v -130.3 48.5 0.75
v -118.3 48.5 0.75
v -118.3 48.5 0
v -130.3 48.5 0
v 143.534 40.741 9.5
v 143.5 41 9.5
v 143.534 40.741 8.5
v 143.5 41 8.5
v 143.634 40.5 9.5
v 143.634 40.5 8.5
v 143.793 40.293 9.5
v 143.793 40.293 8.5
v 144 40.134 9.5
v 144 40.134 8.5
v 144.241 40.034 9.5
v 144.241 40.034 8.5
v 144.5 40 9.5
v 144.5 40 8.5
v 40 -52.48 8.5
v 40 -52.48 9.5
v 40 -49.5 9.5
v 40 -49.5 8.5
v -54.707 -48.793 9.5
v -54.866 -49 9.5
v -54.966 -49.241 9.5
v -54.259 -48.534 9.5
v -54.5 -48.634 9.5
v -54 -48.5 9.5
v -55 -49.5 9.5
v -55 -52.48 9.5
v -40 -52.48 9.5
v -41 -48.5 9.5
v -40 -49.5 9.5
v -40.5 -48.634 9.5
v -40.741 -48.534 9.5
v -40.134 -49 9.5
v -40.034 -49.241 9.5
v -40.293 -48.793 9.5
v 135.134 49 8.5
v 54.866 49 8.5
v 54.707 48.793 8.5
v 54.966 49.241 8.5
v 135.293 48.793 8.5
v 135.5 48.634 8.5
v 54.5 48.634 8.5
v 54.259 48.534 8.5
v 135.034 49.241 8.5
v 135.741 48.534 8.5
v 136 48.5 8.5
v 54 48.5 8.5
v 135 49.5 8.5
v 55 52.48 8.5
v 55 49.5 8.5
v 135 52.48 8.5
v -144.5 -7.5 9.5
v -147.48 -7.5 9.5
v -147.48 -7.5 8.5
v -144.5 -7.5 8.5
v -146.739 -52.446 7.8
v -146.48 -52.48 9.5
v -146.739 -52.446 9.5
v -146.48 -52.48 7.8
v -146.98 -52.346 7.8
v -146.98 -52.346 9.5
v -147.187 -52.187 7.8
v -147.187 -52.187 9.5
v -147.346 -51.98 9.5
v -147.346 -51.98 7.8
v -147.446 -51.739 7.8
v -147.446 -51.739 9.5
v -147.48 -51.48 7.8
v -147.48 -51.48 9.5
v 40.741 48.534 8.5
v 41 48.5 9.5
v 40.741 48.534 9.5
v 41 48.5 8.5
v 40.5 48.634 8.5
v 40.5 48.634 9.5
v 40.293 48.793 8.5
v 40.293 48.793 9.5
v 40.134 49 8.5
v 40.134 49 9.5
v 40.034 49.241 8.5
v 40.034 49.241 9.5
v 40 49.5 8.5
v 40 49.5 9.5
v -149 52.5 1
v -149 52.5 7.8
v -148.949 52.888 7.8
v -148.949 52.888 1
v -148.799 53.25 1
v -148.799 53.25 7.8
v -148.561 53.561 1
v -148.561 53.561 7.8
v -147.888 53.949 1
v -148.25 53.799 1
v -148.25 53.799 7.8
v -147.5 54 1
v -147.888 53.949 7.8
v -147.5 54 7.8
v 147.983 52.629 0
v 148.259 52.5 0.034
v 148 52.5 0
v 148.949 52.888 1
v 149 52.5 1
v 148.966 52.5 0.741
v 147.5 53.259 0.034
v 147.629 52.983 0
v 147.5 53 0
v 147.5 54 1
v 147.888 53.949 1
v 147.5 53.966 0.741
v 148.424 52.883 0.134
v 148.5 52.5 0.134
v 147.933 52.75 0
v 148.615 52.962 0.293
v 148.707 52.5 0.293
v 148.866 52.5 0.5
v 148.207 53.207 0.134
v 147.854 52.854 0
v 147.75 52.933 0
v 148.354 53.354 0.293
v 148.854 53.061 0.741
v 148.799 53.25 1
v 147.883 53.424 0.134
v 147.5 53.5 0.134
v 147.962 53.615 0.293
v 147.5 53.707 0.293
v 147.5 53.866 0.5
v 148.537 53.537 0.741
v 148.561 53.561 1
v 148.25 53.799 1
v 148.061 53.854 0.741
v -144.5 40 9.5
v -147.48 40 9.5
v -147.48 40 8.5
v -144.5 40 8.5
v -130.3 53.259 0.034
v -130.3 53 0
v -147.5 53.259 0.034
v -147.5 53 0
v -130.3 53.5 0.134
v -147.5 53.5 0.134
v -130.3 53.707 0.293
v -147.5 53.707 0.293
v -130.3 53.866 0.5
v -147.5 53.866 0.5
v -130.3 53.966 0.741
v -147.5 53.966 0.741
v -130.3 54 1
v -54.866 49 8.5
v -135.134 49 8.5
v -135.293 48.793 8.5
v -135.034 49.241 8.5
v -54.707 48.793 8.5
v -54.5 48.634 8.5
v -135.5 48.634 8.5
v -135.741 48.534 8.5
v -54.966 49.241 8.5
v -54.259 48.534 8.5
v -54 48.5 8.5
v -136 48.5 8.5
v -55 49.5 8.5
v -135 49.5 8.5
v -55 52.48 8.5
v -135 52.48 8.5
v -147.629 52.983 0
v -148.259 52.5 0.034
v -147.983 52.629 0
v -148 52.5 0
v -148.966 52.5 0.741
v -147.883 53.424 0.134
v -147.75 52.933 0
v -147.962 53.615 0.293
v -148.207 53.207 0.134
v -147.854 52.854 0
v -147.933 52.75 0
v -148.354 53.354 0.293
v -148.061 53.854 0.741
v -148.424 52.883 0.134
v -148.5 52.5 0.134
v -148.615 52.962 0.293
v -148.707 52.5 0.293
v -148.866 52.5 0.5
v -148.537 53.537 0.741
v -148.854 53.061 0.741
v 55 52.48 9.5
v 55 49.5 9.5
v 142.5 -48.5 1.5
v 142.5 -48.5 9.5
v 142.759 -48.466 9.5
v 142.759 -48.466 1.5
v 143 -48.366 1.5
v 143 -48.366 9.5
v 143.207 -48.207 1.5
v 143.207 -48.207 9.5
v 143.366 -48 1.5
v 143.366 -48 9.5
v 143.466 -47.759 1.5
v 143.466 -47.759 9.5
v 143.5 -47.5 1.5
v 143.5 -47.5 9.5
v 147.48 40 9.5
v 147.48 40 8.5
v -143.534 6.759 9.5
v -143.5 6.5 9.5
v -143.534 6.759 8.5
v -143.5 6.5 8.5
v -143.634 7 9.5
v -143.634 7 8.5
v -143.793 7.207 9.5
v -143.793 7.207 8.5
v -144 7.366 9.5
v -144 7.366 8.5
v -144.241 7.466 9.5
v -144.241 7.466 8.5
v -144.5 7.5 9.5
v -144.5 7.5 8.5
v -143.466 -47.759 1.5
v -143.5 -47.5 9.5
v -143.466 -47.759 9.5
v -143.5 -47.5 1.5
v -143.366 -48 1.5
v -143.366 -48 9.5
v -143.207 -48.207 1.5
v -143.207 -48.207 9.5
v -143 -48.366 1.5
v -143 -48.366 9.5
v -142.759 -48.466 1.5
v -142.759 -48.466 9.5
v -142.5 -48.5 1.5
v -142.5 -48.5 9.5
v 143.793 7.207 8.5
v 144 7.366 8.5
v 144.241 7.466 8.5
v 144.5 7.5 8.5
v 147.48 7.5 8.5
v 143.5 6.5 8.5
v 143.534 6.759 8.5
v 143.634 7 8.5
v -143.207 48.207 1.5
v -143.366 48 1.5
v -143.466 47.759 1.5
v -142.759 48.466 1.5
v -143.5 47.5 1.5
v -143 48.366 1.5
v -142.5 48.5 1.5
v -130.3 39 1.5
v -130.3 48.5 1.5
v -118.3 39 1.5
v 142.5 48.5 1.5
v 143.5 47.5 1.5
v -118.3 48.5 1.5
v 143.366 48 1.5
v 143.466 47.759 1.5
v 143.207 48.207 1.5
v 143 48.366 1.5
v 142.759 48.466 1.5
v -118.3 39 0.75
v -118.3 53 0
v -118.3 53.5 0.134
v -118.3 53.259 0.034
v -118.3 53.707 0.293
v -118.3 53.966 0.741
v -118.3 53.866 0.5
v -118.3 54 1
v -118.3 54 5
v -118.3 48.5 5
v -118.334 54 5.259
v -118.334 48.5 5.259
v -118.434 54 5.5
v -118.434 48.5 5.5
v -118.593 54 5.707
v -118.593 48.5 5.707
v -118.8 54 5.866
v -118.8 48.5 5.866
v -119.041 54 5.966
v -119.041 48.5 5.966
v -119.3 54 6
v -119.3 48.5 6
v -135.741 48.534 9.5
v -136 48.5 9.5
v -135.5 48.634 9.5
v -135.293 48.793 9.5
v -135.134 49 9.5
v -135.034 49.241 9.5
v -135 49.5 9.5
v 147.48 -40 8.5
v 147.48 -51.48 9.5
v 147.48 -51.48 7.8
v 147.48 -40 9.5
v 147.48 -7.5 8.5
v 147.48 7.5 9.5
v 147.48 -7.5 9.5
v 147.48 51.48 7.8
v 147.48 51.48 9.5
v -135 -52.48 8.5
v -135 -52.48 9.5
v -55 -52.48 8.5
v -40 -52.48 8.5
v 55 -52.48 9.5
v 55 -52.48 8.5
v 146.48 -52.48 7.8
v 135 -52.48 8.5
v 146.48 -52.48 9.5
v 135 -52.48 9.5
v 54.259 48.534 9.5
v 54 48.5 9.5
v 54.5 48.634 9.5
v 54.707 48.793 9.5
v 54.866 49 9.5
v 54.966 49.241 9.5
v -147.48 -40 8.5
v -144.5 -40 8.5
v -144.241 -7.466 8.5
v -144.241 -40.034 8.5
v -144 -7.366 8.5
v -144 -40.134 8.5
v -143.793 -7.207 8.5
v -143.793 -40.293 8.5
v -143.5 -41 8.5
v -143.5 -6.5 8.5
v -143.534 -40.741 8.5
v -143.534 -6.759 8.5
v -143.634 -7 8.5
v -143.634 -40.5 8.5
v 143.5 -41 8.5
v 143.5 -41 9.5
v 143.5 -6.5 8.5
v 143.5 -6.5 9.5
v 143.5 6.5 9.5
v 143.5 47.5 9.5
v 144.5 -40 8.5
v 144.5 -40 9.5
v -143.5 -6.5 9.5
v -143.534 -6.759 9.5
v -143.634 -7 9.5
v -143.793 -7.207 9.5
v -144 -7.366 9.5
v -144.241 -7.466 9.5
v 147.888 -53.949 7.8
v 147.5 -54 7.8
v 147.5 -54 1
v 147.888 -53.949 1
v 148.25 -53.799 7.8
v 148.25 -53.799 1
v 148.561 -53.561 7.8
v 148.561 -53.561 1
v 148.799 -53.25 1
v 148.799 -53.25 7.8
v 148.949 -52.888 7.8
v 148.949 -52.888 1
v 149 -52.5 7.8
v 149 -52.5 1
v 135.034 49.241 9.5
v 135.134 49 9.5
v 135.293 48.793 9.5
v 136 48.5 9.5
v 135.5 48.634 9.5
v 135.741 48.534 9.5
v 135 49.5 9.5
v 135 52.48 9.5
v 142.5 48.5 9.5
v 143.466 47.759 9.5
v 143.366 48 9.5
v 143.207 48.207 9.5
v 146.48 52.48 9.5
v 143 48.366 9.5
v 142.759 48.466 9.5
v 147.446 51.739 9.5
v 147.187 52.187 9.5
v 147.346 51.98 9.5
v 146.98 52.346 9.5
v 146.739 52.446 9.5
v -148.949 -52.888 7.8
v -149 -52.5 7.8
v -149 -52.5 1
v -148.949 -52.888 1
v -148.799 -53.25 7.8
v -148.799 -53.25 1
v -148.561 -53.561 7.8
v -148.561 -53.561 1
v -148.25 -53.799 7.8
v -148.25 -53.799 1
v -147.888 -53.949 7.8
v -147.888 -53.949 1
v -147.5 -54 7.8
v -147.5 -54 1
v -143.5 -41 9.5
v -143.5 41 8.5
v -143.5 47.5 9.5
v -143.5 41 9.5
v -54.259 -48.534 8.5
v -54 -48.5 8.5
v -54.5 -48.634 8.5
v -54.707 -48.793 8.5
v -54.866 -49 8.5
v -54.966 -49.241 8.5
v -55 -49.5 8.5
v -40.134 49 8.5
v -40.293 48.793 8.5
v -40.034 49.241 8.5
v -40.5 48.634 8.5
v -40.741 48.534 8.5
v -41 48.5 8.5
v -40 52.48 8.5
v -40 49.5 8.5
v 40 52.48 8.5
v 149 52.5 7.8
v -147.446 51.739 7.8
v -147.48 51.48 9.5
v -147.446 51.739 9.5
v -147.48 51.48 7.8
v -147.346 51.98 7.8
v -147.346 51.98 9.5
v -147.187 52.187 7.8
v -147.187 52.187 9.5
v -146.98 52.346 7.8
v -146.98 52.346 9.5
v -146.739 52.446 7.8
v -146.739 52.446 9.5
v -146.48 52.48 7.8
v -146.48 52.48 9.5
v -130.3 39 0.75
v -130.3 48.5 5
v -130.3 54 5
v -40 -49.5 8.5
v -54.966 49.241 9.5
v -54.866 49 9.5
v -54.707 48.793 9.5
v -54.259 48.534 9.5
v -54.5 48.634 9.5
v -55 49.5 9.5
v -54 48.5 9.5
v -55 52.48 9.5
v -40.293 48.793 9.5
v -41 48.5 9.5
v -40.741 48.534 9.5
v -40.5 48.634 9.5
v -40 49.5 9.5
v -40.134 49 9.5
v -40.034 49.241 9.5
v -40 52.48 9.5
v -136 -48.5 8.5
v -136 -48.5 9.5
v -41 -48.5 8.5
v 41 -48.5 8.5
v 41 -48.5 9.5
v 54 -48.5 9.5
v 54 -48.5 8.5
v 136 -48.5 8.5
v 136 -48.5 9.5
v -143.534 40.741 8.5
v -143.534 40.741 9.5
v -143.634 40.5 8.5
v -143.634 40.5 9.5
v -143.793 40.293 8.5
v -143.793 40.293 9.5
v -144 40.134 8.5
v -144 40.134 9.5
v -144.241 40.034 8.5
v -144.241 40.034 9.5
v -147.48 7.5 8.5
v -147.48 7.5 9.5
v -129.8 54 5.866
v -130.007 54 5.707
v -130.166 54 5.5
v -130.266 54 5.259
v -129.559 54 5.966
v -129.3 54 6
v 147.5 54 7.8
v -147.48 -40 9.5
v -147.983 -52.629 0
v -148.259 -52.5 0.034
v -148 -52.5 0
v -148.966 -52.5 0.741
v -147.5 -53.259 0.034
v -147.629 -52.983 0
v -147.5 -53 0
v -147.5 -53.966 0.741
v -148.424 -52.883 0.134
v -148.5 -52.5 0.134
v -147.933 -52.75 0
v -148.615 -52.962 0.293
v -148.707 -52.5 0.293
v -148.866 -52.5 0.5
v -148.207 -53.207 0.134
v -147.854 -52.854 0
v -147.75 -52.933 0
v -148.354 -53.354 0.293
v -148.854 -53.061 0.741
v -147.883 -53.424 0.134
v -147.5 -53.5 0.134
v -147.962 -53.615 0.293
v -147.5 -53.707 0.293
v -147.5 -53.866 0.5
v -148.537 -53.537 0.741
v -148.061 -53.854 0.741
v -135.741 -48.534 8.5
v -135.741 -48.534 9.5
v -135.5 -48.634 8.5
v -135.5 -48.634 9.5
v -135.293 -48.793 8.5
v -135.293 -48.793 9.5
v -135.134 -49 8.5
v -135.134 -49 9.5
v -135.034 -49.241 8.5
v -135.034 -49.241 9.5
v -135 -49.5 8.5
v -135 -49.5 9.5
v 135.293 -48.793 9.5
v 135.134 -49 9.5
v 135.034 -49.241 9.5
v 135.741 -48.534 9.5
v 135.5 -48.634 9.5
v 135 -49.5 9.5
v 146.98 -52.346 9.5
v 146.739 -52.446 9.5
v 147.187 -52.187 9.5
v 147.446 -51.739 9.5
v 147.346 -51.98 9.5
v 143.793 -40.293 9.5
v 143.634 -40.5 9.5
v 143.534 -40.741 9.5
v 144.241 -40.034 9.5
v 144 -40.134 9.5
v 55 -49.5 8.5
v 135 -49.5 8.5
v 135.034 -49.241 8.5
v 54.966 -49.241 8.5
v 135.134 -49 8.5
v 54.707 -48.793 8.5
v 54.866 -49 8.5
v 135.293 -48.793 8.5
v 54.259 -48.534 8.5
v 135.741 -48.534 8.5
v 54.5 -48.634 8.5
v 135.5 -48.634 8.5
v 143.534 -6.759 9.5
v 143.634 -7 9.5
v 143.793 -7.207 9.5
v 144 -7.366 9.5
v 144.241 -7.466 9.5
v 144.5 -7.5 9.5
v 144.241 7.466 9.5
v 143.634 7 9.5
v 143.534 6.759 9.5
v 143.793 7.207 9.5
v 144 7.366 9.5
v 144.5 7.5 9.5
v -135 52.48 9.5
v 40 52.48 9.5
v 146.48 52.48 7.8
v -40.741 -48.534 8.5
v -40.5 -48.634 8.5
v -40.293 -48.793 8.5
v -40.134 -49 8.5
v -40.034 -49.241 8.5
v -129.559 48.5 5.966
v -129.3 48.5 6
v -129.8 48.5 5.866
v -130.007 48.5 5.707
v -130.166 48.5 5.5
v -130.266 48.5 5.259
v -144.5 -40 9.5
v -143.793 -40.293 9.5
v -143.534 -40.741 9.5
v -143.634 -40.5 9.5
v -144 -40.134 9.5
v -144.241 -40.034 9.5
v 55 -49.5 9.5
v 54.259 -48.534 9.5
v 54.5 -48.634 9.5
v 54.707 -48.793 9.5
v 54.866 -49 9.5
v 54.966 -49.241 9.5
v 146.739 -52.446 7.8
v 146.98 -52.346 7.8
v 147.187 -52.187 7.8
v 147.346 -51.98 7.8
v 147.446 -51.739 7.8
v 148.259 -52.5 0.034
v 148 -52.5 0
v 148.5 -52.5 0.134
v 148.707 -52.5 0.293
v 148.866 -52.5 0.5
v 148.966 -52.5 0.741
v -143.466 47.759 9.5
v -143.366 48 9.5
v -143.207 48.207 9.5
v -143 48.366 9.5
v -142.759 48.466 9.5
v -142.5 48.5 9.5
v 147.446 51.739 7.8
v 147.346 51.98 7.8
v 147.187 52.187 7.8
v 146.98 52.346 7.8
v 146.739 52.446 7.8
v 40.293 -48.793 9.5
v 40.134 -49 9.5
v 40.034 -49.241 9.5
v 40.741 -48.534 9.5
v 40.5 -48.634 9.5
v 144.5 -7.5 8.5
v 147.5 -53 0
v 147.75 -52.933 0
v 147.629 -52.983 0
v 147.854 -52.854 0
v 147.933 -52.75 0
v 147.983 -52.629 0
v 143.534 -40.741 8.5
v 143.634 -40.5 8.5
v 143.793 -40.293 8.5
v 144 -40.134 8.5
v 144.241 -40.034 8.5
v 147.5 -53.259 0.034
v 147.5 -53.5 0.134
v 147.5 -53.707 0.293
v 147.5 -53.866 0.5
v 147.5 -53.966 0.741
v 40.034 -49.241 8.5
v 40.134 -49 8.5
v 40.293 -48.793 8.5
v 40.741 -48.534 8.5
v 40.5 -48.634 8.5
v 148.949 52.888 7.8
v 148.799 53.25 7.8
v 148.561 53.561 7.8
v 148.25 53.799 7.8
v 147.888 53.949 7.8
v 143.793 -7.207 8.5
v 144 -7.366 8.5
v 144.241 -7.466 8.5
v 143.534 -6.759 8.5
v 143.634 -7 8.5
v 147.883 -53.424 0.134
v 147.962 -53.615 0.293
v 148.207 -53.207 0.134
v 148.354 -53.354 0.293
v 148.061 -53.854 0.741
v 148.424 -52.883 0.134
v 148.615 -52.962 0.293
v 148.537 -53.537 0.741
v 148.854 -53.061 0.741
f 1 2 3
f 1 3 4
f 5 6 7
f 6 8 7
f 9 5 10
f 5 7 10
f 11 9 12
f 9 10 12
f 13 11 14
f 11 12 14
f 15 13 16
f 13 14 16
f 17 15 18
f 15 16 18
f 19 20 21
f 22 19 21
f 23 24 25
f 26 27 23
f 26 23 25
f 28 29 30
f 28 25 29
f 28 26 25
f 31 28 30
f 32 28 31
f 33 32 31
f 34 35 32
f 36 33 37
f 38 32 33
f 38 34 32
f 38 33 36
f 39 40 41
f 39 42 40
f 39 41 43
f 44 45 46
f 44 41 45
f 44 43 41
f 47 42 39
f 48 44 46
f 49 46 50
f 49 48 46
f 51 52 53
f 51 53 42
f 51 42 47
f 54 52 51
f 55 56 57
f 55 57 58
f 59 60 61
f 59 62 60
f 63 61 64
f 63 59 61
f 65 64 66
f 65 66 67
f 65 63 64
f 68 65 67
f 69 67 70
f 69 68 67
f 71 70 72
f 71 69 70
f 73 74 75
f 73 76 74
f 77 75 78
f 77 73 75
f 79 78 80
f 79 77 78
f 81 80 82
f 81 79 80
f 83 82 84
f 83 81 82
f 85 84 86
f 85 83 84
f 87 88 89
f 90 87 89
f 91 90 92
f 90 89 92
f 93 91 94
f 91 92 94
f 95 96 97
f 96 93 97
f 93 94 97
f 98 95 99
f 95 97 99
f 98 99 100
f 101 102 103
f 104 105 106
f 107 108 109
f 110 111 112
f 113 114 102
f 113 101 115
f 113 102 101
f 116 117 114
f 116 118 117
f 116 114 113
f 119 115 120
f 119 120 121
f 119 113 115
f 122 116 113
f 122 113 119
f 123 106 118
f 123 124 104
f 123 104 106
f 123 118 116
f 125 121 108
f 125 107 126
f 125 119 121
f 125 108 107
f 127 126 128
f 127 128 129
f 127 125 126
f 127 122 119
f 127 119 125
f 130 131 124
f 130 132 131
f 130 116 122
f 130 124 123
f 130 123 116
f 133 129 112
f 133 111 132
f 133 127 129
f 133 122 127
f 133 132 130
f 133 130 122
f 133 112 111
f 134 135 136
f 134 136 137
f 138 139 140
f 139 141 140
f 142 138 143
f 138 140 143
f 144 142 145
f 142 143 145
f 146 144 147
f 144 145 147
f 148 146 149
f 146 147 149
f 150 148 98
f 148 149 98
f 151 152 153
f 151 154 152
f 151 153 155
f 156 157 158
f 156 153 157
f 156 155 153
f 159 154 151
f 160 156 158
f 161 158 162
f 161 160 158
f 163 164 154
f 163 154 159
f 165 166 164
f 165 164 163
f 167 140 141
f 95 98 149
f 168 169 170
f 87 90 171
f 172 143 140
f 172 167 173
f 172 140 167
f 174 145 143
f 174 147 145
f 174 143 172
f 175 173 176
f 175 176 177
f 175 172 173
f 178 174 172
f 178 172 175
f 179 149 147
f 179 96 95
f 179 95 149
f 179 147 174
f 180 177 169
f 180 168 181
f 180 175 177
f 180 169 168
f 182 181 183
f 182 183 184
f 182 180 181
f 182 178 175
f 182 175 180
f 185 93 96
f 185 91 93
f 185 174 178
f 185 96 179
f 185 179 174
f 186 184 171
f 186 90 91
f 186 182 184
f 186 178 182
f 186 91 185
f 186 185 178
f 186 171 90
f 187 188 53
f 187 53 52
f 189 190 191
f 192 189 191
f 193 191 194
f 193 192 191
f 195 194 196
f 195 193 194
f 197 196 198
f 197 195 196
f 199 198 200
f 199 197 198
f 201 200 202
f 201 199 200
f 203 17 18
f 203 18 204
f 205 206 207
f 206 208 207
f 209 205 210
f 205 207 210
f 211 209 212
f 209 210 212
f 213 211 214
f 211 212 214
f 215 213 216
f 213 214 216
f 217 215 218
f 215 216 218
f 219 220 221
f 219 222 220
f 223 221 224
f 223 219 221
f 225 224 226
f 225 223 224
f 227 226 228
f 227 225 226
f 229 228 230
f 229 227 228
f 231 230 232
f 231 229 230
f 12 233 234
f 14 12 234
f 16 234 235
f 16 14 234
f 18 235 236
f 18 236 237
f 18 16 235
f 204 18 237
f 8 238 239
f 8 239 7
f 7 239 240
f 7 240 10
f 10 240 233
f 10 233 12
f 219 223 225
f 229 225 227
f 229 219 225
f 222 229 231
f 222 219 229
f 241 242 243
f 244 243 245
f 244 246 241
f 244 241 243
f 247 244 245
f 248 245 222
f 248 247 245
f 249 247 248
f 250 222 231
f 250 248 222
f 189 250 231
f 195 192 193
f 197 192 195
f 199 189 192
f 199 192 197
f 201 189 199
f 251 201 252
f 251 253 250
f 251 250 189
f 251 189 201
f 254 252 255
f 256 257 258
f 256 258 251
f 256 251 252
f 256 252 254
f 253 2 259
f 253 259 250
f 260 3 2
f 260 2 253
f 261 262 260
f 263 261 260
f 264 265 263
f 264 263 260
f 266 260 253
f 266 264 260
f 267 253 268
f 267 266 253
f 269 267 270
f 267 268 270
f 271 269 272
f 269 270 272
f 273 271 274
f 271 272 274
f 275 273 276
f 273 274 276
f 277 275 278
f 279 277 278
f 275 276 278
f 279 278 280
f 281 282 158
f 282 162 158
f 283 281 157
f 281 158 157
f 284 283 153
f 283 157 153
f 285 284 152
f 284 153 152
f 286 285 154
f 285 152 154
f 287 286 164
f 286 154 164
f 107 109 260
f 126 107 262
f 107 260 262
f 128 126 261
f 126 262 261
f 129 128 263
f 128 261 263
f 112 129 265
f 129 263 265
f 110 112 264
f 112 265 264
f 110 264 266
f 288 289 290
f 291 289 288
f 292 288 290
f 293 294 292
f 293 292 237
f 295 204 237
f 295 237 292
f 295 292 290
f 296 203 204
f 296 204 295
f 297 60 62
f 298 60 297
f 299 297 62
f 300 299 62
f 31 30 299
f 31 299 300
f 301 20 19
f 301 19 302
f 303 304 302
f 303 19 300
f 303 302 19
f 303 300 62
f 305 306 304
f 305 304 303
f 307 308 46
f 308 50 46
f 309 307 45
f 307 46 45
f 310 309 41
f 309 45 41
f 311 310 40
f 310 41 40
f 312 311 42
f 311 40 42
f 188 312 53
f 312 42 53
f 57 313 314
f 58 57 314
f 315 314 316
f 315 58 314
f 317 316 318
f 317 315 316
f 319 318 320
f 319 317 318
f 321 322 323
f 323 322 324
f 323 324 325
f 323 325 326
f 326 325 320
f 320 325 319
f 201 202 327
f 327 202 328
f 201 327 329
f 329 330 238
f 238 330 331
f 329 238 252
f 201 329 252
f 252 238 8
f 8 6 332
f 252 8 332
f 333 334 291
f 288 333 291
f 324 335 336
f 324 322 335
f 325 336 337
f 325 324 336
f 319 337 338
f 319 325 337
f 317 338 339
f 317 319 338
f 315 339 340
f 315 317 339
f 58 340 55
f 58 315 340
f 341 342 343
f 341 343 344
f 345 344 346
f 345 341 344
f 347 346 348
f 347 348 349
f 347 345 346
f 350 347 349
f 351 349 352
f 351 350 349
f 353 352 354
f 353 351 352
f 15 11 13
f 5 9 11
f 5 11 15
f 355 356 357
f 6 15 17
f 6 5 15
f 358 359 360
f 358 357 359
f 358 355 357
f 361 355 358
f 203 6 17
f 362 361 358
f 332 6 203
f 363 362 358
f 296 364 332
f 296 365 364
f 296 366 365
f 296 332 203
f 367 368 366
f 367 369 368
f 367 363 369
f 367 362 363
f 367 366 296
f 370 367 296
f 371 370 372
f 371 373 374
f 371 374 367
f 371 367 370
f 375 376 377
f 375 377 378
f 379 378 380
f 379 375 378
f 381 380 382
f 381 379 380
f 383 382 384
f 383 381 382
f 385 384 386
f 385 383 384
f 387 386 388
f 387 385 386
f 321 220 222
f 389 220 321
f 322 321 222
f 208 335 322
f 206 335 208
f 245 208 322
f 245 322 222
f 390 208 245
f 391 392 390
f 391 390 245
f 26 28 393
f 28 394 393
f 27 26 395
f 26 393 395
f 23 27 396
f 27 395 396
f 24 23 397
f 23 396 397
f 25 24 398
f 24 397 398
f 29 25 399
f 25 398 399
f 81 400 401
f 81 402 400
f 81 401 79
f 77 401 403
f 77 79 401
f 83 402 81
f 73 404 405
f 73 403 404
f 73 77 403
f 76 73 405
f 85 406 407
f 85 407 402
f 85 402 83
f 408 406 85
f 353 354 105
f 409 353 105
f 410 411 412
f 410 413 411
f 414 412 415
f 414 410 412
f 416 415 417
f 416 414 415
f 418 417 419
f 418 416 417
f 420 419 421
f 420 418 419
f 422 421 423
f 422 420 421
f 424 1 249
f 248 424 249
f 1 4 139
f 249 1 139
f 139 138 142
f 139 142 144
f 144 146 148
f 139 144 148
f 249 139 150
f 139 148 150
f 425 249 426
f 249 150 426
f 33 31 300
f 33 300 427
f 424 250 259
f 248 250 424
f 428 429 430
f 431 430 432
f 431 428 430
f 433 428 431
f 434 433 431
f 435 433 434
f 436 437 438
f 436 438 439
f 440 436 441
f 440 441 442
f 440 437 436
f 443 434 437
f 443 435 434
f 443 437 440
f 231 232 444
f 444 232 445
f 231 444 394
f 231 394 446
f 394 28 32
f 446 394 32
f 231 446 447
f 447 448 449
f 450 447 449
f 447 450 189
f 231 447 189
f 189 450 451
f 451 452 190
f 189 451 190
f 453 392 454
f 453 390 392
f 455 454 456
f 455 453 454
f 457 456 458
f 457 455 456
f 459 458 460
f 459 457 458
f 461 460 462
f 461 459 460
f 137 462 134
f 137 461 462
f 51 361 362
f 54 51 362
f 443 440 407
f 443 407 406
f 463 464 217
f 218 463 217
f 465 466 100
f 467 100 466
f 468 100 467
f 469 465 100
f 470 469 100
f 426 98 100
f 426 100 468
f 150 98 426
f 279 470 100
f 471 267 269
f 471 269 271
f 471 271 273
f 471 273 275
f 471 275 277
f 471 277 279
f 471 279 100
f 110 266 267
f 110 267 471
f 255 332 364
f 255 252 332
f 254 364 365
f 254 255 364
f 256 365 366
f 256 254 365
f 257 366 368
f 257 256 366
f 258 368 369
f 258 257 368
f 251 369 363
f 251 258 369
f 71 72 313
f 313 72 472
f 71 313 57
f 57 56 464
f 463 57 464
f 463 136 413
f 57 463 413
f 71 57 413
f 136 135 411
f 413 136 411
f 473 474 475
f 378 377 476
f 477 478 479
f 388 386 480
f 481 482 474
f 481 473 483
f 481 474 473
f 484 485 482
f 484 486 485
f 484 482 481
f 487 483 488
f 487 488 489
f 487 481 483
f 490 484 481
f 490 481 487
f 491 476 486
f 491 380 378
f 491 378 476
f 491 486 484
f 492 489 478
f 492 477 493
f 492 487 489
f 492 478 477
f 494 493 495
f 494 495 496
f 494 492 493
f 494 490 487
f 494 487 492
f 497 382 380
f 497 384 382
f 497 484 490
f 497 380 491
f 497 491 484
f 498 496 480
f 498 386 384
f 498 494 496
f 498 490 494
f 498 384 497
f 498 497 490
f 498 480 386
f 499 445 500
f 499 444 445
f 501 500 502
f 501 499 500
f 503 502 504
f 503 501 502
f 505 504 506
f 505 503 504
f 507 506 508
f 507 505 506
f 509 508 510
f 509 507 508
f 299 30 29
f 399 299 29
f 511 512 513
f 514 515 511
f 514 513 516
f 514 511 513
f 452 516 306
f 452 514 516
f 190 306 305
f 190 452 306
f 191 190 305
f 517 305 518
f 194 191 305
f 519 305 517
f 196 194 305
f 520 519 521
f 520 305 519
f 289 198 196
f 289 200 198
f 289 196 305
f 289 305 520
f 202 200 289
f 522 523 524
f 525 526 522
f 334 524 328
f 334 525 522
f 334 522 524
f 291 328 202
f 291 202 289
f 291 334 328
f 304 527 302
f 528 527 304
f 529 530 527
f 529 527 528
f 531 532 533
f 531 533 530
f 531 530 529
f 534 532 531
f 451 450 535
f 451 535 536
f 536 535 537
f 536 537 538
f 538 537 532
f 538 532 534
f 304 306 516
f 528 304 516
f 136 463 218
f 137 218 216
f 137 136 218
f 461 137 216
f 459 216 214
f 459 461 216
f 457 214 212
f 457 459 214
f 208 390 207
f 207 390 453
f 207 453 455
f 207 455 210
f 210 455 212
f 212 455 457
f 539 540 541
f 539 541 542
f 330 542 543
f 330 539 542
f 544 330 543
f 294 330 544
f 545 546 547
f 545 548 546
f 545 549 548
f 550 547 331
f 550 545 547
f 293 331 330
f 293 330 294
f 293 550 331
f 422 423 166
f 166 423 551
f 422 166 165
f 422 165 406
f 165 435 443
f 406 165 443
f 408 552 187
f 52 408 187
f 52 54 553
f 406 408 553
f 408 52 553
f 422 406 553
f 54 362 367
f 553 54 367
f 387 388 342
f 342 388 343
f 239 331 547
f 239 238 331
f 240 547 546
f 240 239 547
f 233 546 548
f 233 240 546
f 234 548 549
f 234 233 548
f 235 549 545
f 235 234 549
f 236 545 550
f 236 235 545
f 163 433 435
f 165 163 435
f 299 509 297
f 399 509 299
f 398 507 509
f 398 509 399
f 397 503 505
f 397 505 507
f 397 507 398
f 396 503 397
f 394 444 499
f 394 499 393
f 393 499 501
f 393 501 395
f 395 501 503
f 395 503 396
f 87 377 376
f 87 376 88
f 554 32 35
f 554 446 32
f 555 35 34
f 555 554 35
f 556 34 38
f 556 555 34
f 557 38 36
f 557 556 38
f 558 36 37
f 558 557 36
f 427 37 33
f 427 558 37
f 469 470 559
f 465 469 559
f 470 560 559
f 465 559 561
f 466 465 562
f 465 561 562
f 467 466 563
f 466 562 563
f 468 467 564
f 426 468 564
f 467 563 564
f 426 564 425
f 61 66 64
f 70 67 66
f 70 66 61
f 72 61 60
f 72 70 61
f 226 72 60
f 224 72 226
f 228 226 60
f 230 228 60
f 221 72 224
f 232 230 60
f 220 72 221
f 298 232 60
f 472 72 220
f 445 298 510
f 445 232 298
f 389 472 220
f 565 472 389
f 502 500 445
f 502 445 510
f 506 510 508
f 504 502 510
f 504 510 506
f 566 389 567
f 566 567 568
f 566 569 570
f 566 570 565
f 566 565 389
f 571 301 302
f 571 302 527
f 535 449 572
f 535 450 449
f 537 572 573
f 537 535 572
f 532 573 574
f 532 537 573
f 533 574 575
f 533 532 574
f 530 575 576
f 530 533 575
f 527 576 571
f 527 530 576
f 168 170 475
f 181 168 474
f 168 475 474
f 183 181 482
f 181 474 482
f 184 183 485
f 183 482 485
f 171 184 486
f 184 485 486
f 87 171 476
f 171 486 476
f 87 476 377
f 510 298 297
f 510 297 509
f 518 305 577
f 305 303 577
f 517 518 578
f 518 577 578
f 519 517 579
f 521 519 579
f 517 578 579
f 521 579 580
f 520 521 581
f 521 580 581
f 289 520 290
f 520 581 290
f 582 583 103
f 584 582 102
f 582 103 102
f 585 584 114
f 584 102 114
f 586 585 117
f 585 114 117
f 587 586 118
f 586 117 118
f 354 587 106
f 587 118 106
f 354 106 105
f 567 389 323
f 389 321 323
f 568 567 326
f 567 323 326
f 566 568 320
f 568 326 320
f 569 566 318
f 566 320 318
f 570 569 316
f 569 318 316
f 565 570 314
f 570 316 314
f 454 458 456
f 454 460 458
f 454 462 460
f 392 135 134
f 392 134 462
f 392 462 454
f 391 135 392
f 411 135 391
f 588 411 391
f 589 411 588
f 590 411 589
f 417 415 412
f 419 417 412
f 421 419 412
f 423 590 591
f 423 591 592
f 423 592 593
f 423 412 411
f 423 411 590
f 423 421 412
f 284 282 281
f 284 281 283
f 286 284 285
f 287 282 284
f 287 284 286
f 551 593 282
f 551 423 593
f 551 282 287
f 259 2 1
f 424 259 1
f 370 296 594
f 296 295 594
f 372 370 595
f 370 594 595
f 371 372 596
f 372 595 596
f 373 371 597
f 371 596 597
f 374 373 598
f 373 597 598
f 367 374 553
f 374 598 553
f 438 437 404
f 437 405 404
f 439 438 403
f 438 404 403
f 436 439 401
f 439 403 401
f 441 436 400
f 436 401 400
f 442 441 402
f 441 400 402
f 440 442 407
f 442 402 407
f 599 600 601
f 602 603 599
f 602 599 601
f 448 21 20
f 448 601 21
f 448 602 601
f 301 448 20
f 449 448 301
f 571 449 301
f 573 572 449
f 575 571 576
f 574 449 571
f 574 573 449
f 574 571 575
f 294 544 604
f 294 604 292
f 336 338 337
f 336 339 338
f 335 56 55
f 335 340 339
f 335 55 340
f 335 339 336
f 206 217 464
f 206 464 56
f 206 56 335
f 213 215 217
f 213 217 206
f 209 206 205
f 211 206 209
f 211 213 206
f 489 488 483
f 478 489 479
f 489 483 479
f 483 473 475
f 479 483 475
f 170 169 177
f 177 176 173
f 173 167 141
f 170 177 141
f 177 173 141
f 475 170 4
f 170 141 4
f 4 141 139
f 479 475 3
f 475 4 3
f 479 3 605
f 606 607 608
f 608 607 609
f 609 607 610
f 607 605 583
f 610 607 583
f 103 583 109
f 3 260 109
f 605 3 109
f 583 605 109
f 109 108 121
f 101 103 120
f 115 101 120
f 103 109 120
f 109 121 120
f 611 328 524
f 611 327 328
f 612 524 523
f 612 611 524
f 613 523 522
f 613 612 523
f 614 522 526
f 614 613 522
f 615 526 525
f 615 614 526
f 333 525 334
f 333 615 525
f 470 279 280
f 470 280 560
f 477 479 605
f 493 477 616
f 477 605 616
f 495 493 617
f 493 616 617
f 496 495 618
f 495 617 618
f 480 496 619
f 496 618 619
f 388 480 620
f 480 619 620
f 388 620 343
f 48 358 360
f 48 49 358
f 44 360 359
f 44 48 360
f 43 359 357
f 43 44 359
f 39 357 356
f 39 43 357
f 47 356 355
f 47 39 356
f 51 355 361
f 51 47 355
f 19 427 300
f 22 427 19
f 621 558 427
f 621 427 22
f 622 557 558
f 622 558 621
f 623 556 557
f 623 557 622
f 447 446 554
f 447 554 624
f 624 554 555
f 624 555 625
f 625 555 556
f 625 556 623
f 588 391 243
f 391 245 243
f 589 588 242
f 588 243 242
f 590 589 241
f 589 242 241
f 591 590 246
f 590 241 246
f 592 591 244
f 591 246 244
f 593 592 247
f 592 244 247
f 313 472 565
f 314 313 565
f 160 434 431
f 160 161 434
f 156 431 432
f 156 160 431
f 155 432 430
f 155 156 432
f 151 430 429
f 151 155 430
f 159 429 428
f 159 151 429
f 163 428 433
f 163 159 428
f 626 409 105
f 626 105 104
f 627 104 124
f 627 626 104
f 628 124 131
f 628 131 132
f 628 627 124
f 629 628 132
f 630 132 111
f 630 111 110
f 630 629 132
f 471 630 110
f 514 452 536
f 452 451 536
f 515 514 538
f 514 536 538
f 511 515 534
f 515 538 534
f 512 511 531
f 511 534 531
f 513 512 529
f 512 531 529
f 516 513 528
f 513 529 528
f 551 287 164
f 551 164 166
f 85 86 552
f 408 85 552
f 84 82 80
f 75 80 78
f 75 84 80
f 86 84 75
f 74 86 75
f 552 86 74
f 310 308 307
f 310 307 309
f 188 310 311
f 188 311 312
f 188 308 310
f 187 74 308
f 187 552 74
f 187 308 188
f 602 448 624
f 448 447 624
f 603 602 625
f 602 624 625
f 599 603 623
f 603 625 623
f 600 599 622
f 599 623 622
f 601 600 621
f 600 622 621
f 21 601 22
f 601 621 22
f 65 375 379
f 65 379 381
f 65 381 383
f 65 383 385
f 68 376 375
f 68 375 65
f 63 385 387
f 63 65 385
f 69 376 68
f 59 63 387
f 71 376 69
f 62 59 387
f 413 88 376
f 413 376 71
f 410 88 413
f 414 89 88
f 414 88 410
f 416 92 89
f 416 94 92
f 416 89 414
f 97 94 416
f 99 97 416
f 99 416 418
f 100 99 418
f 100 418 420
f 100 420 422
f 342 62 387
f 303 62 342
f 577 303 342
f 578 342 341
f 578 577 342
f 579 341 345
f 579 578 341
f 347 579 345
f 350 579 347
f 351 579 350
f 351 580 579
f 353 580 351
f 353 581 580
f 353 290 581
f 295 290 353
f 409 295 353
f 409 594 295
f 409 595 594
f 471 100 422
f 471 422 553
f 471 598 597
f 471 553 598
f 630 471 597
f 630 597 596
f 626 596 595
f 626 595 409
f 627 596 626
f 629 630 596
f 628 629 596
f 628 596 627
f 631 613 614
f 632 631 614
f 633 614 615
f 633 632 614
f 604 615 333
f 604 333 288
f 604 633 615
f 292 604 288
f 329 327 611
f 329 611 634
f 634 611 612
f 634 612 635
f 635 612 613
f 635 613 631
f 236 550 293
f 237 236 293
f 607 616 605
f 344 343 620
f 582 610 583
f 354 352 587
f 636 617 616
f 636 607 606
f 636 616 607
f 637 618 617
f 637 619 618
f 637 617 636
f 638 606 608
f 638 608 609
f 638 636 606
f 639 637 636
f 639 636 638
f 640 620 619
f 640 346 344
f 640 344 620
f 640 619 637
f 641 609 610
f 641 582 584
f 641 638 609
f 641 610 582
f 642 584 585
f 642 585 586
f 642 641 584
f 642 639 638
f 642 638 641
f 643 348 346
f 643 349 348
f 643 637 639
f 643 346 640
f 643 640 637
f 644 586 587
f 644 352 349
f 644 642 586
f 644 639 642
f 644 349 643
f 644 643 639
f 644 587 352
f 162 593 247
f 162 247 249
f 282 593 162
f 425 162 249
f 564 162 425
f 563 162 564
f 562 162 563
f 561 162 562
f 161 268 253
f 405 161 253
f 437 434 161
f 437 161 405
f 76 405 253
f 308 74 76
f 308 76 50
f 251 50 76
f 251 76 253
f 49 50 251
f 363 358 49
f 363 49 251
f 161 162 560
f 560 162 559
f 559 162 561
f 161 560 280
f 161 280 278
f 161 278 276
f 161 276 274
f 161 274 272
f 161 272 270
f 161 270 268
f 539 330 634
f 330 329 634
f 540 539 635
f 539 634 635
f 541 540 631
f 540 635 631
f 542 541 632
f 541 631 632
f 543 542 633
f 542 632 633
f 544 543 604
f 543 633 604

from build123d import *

# Parameters (mm, degrees)
SKETCH001_W     = 298
SKETCH001_H     = 108
PAD_DEPTH       = 9.5
SKETCH002_W     = 287
SKETCH002_H     = 97
POCKET_DEPTH    = 8
SKETCH003_W     = 299
SKETCH003_H     = 109
SKETCH003_W_2   = 294.96
SKETCH003_H_2   = 104.96
POCKET001_DEPTH = 1.7
SKETCH004_W     = 80
SKETCH004_H     = 4
SKETCH004_W_2   = 4
SKETCH004_H_2   = 32.5
POCKET002_DEPTH = 1
SKETCH005_W     = 12
SKETCH005_H     = 3.5
POCKET003_DEPTH = 15
SKETCH_W        = 12
SKETCH_H        = 6
POCKET004_DEPTH = 5.5
FILLET_R        = 1.5
FILLET001_R     = 1
FILLET002_R     = 1
FILLET003_R     = 1
FILLET004_R     = 1
FILLET005_R     = 1


with BuildPart() as part:
    # Sketch001 → Pad (new body)
    with BuildSketch(Plane.XY):
        Rectangle(SKETCH001_W, SKETCH001_H)
    extrude(amount=PAD_DEPTH)

    # Sketch002 (on Face6 of Pad) → Pocket (cut)
    with BuildSketch(Plane.XY.offset(9.5)):
        Rectangle(SKETCH002_W, SKETCH002_H)
    extrude(amount=-POCKET_DEPTH, mode=Mode.SUBTRACT)

    # Sketch003 (on Face5 of Pocket) → Pocket001 (cut)
    with BuildSketch(Plane.XY.offset(9.5)):
        Rectangle(SKETCH003_W, SKETCH003_H)
        Rectangle(SKETCH003_W_2, SKETCH003_H_2, mode=Mode.SUBTRACT)
    extrude(amount=-POCKET001_DEPTH, mode=Mode.SUBTRACT)

    # Sketch004 (on Face11 of Pocket001) → Pocket002 (cut)
    with BuildSketch(Plane.XY.offset(9.5)):
        with Locations((-95, 50.5)):
            Rectangle(SKETCH004_W, SKETCH004_H)
        with Locations((0, 50.5)):
            Rectangle(SKETCH004_W, SKETCH004_H)
        with Locations((95, 50.5)):
            Rectangle(SKETCH004_W, SKETCH004_H)
        with Locations((95, -50.5)):
            Rectangle(SKETCH004_W, SKETCH004_H)
        with Locations((0, -50.5)):
            Rectangle(SKETCH004_W, SKETCH004_H)
        with Locations((-95, -50.5)):
            Rectangle(SKETCH004_W, SKETCH004_H)
        with Locations((-145.5, 23.75)):
            Rectangle(SKETCH004_W_2, SKETCH004_H_2)
        with Locations((-145.5, -23.75)):
            Rectangle(SKETCH004_W_2, SKETCH004_H_2)
        with Locations((145.5, 23.75)):
            Rectangle(SKETCH004_W_2, SKETCH004_H_2)
        with Locations((145.5, -23.75)):
            Rectangle(SKETCH004_W_2, SKETCH004_H_2)
    extrude(amount=-POCKET002_DEPTH, mode=Mode.SUBTRACT)

    # Sketch005 (on Face1 of Pocket002) → Pocket003 (cut)
    with BuildSketch(Plane(origin=(0, 54, 0), x_dir=(-1, 0, 0), z_dir=(0, 1, 0))):
        with Locations((124.3, 2.5)):
            Rectangle(SKETCH005_W, SKETCH005_H)
    extrude(amount=-POCKET003_DEPTH, mode=Mode.SUBTRACT)

    # Sketch (on Face1 of Pocket003) → Pocket004 (cut)
    with BuildSketch(Plane(origin=(0, 54, 0), x_dir=(-1, 0, 0), z_dir=(0, 1, 0))):
        with Locations((124.3, 3)):
            Rectangle(SKETCH_W, SKETCH_H)
    extrude(amount=-POCKET004_DEPTH, mode=Mode.SUBTRACT)

    # Fillet
    fillet_edges = [part.edges().sort_by_distance(p)[0] for p in [
        (-149, 54, 3.9),
        (-149, -54, 3.9),
        (149, 54, 3.9),
        (149, -54, 3.9),
    ]]
    fillet(fillet_edges, radius=FILLET_R)

    # Fillet001
    fillet001_edges = [part.edges().sort_by_distance(p)[0] for p in [
        (147.48, -52.48, 8.65),
        (-147.48, -52.48, 8.65),
        (147.48, 52.48, 8.65),
        (-147.48, 52.48, 8.65),
    ]]
    fillet(fillet001_edges, radius=FILLET001_R)

    # Fillet002
    fillet002_edges = [part.edges().sort_by_distance(p)[0] for p in [
        (143.5, 48.5, 5.5),
        (-143.5, 48.5, 5.5),
        (-143.5, -48.5, 5.5),
        (143.5, -48.5, 5.5),
    ]]
    fillet(fillet002_edges, radius=FILLET002_R)

    # Fillet003
    fillet003_edges = [part.edges().sort_by_distance(p)[0] for p in [
        (143.5, 40, 9),
        (135, 48.5, 9),
        (55, 48.5, 9),
        (40, 48.5, 9),
        (143.5, -7.5, 9),
        (143.5, 7.5, 9),
        (143.5, -40, 9),
        (135, -48.5, 9),
        (40, -48.5, 9),
        (-55, -48.5, 9),
        (-40, 48.5, 9),
        (-55, 48.5, 9),
        (-135, 48.5, 9),
        (-143.5, 40, 9),
        (-143.5, -7.5, 9),
        (-143.5, 7.5, 9),
        (-143.5, -40, 9),
        (-135, -48.5, 9),
        (-40, -48.5, 9),
        (55, -48.5, 9),
    ]]
    fillet(fillet003_edges, radius=FILLET003_R)

    # Fillet004
    fillet004_edges = [part.edges().sort_by_distance(p)[0] for p in [
        (-118.3, 51.25, 6),
        (-130.3, 51.25, 6),
    ]]
    fillet(fillet004_edges, radius=FILLET004_R)

    # Fillet005
    fillet005_edges = [part.edges().sort_by_distance(p)[0] for p in [
        (0, -54, 0),
    ]]
    fillet(fillet005_edges, radius=FILLET005_R)


solid = part.part
